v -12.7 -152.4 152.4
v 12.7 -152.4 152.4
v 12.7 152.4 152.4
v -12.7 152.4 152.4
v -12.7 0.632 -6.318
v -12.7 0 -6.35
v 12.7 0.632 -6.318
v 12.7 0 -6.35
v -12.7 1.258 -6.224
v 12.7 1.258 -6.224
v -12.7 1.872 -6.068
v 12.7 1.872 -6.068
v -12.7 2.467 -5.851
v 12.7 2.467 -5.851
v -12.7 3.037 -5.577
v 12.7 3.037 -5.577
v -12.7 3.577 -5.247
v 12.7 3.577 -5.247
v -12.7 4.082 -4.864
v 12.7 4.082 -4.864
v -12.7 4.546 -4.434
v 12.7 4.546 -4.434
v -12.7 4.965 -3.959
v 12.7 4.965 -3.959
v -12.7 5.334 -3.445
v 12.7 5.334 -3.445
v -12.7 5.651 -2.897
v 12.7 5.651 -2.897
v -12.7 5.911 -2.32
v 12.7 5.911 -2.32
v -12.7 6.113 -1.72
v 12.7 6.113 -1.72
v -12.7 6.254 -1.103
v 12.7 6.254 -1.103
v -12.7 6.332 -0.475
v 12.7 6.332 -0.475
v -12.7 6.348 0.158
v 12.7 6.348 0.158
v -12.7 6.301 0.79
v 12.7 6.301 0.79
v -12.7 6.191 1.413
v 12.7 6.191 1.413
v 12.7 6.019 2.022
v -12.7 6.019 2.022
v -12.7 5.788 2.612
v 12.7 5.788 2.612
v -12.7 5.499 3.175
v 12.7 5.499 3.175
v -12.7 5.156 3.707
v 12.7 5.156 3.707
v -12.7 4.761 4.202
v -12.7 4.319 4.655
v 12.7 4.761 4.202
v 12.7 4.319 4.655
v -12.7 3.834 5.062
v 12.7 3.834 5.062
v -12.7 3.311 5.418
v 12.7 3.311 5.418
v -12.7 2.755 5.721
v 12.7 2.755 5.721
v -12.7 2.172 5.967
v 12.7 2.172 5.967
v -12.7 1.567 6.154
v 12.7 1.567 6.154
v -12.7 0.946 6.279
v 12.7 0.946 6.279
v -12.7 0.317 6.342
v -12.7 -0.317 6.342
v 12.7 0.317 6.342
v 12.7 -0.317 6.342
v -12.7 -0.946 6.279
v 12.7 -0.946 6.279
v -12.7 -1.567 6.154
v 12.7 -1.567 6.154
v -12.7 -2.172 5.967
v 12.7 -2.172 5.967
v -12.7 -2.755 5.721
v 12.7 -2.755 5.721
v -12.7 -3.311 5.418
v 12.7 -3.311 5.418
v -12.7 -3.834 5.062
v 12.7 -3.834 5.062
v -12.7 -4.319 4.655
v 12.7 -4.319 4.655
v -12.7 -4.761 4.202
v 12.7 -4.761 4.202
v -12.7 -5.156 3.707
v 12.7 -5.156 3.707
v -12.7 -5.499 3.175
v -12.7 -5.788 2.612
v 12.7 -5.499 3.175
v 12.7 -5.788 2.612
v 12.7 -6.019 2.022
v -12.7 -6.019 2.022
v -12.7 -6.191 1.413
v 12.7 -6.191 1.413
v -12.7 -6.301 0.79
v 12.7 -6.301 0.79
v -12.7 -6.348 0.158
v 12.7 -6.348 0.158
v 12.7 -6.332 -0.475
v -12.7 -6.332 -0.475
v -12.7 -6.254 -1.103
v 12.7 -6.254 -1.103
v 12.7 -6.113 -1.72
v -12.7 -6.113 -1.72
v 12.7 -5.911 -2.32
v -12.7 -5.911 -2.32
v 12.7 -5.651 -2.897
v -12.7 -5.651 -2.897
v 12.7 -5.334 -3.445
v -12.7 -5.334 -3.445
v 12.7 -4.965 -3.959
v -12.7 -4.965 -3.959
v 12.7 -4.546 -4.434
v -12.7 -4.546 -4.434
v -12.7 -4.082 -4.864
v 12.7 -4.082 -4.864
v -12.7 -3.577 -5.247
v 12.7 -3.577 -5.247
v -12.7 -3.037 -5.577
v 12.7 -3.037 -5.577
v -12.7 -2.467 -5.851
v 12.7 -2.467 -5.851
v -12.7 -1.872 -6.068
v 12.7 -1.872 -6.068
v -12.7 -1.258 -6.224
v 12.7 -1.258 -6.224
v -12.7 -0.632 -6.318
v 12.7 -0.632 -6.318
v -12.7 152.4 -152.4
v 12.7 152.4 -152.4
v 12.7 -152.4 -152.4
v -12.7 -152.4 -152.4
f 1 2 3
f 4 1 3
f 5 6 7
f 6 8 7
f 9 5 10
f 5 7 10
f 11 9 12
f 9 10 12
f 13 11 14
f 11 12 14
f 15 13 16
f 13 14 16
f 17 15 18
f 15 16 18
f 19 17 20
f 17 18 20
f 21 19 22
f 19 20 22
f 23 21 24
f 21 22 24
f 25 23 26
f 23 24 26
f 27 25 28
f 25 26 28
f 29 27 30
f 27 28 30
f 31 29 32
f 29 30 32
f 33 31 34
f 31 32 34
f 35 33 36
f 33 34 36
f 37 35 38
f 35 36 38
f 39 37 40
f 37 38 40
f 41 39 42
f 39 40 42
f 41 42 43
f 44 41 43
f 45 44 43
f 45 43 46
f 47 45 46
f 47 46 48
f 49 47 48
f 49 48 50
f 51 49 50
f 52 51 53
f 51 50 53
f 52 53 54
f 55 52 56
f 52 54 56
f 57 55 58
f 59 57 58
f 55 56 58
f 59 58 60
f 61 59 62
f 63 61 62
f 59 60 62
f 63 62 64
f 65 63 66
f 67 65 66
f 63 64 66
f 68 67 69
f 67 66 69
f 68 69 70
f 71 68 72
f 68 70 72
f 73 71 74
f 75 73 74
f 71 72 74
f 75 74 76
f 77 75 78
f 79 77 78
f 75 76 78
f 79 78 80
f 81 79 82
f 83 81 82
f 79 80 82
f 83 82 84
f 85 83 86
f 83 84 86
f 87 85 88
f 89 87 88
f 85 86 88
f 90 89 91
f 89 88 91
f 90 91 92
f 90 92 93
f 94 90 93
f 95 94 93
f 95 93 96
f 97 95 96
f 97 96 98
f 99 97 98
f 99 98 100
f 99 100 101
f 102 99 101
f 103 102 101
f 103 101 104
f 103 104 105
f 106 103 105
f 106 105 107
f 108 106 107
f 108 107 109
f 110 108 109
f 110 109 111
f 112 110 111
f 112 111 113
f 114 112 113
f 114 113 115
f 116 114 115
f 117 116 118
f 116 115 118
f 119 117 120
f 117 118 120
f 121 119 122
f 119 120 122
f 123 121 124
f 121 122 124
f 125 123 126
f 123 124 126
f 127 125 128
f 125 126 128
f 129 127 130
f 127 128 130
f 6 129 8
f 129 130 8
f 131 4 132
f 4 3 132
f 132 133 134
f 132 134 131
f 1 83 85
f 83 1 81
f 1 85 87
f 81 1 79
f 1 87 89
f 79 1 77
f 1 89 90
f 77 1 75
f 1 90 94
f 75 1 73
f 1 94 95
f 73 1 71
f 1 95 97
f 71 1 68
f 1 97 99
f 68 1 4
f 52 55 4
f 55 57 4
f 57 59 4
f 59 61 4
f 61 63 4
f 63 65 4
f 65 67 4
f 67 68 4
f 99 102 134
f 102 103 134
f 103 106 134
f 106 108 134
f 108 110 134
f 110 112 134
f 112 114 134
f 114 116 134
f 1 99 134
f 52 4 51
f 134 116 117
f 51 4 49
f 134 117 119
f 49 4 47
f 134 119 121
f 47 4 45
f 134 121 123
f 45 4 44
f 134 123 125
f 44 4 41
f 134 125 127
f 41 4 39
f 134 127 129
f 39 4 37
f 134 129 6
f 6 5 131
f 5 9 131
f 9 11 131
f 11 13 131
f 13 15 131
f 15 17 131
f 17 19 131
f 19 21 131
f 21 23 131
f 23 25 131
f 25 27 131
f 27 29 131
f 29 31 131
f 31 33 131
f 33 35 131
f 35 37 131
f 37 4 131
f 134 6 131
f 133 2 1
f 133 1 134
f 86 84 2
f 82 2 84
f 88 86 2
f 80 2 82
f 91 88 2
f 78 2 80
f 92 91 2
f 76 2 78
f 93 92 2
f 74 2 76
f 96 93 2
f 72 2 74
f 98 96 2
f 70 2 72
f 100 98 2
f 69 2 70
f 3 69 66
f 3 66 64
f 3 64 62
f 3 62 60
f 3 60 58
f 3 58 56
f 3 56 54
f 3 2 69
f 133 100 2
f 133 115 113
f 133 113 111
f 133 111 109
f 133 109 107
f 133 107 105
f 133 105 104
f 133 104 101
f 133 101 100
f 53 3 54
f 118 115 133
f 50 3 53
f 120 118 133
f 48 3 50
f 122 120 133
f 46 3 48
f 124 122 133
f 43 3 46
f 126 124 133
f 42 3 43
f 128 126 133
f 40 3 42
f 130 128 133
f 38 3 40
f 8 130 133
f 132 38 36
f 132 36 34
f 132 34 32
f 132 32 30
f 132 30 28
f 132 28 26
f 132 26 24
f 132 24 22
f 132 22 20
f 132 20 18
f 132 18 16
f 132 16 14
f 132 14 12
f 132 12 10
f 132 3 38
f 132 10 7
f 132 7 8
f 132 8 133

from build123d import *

# Parameters (mm, degrees)
SKETCH1_W               = 304.8
SKETCH1_H               = 304.8
BOSS_EXTRUDE1_DEPTH     = 12.7
CUT_EXTRUDE1_DEPTH      = 216.9
CUT_EXTRUDE1_DEPTH_BACK = 216.9
SKETCH2_R               = 6.35


with BuildPart() as part:
    # Sketch1 → Boss-Extrude1 (new, symmetric)
    with BuildSketch(Plane(origin=(0, 0, 0), x_dir=(0, 0, -1), z_dir=(1, 0, 0))):
        Rectangle(SKETCH1_W, SKETCH1_H)
    extrude(amount=BOSS_EXTRUDE1_DEPTH, both=True)

    # Sketch2 → Cut-Extrude1 (cut, two sides: drawn at the far end of the back side and taken through both)
    with BuildSketch(Plane(origin=(0, 0, 0), x_dir=(0, 0, -1), z_dir=(1, 0, 0)).offset(-CUT_EXTRUDE1_DEPTH_BACK)):
        Circle(SKETCH2_R)
    extrude(amount=CUT_EXTRUDE1_DEPTH + CUT_EXTRUDE1_DEPTH_BACK, mode=Mode.SUBTRACT)


solid = part.part
